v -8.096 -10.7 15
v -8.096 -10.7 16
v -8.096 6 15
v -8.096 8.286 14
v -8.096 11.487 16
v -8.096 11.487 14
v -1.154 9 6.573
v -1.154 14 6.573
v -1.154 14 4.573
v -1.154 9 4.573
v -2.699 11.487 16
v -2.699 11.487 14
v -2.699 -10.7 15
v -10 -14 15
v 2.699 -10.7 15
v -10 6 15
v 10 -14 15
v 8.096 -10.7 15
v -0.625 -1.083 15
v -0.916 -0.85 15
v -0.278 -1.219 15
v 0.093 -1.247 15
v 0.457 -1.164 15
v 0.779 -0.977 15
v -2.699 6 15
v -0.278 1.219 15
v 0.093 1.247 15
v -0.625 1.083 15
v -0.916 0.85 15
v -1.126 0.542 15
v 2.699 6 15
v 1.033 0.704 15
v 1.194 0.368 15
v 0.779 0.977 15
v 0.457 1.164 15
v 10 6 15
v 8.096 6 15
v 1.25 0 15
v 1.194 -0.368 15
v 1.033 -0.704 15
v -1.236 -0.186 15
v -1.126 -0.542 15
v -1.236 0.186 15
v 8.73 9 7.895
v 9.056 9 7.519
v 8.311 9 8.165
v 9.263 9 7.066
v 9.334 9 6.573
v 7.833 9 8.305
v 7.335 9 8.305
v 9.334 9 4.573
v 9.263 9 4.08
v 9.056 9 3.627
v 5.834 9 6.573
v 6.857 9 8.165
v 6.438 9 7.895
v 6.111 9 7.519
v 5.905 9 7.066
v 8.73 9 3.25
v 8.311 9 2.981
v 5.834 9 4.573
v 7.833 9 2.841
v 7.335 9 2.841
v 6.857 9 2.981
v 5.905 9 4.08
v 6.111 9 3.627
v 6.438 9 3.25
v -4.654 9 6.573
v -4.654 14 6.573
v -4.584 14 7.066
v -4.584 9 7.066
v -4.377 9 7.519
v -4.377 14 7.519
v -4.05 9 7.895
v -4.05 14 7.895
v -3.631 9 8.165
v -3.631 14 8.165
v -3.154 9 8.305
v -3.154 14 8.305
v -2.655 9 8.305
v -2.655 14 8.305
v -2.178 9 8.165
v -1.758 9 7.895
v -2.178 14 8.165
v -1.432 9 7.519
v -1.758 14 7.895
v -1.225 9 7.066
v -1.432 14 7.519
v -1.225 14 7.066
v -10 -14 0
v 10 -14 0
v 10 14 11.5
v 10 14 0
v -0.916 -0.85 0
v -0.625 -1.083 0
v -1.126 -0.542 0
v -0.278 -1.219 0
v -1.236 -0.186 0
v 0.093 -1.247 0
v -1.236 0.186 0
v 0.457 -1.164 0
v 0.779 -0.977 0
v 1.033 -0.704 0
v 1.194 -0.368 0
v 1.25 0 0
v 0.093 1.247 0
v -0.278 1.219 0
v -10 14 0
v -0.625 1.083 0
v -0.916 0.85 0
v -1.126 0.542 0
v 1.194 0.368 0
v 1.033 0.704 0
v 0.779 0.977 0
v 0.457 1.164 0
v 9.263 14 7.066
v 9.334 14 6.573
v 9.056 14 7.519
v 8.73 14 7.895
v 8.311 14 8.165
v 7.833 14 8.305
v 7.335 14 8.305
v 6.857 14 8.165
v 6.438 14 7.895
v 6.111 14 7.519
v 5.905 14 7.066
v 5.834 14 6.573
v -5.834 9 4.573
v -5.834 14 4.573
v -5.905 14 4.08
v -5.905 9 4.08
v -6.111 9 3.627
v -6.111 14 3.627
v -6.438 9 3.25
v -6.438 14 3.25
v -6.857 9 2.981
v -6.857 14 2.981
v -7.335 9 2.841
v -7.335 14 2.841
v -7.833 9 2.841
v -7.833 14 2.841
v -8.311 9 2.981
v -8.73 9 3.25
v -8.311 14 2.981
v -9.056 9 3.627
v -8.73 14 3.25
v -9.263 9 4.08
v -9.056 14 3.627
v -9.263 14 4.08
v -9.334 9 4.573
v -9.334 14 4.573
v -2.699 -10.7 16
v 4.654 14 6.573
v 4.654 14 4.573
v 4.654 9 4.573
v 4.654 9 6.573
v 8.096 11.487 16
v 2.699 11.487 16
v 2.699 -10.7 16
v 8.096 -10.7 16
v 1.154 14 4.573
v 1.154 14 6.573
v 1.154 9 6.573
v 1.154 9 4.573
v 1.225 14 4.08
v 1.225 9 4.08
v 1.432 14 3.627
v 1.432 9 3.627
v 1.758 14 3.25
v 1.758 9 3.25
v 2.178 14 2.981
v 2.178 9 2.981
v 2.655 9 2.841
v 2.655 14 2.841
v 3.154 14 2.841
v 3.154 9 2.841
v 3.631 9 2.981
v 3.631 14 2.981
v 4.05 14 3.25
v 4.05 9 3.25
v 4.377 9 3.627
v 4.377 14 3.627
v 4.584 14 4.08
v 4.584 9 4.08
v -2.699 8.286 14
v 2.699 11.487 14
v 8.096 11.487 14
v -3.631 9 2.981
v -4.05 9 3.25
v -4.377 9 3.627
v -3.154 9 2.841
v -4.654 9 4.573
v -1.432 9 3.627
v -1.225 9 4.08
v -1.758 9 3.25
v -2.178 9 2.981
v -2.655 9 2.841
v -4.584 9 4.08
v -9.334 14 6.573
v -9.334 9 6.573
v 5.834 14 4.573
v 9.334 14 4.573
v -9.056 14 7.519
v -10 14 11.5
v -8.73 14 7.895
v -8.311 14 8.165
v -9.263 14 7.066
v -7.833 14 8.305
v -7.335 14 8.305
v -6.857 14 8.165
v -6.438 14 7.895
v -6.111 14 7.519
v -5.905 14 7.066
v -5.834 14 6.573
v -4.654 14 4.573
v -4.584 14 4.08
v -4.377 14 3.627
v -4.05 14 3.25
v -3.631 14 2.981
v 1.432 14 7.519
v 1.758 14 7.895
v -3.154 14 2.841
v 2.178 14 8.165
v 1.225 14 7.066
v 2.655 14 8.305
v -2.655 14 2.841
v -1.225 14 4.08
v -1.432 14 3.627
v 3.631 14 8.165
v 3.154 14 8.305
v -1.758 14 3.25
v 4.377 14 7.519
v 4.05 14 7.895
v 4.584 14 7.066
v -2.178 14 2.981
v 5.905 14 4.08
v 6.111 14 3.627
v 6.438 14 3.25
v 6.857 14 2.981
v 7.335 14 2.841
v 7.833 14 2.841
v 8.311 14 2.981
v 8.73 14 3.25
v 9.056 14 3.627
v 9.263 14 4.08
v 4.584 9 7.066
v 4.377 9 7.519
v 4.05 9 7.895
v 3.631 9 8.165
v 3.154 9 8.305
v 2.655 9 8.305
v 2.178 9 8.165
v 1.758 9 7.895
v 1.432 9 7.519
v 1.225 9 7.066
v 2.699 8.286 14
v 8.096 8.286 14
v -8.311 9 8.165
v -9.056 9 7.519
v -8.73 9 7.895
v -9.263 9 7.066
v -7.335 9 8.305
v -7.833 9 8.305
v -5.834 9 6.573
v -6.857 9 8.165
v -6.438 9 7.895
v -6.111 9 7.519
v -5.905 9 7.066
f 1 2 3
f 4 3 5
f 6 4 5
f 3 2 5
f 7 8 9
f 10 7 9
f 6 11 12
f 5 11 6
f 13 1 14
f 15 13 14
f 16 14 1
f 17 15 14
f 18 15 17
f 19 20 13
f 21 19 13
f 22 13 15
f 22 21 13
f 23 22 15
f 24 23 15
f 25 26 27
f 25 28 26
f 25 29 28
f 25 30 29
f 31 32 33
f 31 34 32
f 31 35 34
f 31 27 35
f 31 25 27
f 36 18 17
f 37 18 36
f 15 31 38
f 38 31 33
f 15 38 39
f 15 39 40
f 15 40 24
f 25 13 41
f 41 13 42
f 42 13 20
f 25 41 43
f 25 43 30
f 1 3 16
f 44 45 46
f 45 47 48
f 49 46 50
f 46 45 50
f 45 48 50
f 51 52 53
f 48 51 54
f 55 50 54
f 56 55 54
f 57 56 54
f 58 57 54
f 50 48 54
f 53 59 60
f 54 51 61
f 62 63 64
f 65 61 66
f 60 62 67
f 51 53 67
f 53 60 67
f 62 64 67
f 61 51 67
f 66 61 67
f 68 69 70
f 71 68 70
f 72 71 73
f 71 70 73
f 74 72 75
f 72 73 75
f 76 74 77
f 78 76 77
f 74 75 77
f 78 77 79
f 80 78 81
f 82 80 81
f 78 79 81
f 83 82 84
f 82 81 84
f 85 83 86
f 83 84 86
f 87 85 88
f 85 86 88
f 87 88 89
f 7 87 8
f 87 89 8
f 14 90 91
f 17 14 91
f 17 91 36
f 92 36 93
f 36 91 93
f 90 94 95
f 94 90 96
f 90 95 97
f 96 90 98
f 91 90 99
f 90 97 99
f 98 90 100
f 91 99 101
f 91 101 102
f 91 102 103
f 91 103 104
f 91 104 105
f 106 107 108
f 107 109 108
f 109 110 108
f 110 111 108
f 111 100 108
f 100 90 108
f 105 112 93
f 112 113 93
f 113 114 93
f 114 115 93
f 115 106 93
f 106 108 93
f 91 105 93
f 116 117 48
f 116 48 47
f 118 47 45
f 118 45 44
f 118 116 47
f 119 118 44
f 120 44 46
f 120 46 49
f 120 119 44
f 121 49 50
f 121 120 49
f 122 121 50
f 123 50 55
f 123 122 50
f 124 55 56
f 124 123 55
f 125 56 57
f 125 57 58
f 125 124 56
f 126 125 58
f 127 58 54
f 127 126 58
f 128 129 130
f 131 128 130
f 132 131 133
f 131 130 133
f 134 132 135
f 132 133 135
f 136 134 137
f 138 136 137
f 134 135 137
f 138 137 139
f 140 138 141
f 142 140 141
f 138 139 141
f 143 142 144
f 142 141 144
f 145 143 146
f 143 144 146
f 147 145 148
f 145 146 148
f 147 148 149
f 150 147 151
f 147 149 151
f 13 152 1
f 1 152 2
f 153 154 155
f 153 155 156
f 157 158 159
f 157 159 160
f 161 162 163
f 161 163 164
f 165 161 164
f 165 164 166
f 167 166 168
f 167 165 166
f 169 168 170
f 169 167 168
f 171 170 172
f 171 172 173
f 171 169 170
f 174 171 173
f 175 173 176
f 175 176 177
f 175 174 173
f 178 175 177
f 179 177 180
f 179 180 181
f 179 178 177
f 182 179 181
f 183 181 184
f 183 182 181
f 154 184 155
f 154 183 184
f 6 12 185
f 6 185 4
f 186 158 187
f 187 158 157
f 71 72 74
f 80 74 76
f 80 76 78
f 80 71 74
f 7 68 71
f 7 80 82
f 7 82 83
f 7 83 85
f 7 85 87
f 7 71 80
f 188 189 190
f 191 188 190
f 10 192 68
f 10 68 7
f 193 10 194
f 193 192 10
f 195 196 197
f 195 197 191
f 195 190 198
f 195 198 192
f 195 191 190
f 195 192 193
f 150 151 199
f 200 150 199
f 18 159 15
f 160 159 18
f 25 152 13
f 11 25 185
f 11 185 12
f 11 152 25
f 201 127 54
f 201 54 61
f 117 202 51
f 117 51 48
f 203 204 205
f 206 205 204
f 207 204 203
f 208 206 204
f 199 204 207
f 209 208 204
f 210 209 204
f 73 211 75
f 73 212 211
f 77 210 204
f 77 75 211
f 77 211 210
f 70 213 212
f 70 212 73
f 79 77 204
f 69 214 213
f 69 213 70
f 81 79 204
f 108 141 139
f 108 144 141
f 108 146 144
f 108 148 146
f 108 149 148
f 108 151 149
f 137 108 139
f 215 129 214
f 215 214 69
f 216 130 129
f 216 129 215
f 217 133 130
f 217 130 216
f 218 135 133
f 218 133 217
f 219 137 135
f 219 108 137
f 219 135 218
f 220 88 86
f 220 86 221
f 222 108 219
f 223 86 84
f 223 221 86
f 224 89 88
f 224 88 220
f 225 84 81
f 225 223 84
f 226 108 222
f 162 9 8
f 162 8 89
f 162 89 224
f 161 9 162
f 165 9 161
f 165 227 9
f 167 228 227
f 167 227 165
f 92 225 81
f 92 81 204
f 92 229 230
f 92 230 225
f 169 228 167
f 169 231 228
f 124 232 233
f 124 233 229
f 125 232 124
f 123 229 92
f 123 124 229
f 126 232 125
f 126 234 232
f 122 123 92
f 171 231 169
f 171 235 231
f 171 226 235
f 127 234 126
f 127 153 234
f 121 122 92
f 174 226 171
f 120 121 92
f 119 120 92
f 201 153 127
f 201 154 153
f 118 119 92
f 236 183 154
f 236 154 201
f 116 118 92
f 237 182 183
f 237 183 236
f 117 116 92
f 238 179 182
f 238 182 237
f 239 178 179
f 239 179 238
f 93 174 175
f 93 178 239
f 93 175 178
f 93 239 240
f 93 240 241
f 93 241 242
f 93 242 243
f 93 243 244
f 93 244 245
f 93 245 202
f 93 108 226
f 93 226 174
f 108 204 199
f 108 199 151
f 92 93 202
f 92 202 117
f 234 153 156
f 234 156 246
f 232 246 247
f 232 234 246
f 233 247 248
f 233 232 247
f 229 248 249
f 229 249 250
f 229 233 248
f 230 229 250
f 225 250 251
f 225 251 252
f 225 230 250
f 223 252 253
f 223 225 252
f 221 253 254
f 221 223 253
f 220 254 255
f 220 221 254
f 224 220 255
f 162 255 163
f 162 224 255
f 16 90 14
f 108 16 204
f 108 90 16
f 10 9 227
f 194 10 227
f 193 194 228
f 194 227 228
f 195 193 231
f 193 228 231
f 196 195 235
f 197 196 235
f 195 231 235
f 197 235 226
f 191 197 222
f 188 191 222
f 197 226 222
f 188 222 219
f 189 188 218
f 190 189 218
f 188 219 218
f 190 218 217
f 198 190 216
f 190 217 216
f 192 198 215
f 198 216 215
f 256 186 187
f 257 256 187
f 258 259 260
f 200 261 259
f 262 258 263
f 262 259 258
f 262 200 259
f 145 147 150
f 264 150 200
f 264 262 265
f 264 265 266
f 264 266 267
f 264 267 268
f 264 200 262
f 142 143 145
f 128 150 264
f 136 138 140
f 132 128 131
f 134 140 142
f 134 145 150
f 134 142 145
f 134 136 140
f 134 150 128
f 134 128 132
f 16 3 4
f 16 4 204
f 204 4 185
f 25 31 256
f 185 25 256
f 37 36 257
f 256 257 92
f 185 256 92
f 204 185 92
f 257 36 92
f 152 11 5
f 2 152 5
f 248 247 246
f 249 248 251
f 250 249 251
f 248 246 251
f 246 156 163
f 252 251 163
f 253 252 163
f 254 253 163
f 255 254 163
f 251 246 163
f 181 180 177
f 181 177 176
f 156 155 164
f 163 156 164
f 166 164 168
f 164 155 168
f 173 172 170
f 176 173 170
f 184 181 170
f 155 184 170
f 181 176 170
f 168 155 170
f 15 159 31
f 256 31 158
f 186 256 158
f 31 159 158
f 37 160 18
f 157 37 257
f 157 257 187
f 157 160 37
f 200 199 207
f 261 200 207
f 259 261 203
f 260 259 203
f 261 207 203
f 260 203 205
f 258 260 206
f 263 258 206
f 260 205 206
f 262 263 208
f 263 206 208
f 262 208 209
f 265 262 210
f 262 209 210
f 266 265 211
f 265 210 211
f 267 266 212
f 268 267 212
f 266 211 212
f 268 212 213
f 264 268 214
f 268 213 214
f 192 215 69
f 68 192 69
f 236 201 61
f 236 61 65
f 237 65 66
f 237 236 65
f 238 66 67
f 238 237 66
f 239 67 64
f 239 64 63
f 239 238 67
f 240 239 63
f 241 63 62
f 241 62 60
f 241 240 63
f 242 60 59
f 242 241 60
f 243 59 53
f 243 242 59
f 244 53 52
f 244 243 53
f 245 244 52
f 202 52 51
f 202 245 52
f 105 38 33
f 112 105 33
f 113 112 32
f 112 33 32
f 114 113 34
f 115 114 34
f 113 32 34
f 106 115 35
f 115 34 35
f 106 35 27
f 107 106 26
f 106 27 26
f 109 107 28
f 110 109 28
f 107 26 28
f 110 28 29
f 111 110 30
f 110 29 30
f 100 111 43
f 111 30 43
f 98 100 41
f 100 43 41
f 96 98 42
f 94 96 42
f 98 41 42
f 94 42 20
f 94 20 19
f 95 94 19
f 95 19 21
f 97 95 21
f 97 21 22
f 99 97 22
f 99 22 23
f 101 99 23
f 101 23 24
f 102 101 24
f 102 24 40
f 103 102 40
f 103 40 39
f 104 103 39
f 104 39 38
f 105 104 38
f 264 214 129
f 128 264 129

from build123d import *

# Parameters (mm, degrees)
SKETCH1_W           = 20
SKETCH1_H           = 28
BOSS_EXTRUDE1_DEPTH = 15
CUT_EXTRUDE1_DEPTH  = 21
CUT_EXTRUDE2_DEPTH  = 5
SKETCH4_W           = 5.397016415
SKETCH4_H           = 22.187734152
BOSS_EXTRUDE2_DEPTH = 1
SKETCH5_R           = 1.25
CUT_EXTRUDE3_DEPTH  = 16


with BuildPart() as part:
    # Sketch1 → Boss-Extrude1 (new body)
    with BuildSketch(Plane.XY):
        Rectangle(SKETCH1_W, SKETCH1_H)
    extrude(amount=BOSS_EXTRUDE1_DEPTH)

    # Sketch2 → Cut-Extrude1 (cut, through all)
    with BuildSketch(Plane(origin=(10, 0, 0), x_dir=(0, 0, -1), z_dir=(1, 0, 0))):
        Polygon((-11.5, 14), (-15, 14), (-15, 6), align=None)
    extrude(amount=-CUT_EXTRUDE1_DEPTH, mode=Mode.SUBTRACT)

    # Sketch3 → Cut-Extrude2 (cut)
    with BuildSketch(Plane(origin=(0, 14, 0), x_dir=(1, 0, 0), z_dir=(0, 1, 0))):
        with BuildLine():
            Line((4.654488589, -4.572843843), (4.654488589, -6.572843843))
            ThreePointArc((4.654488589, -6.572843843), (2.904488589, -8.322843843), (1.154488589, -6.572843843))
            Line((1.154488589, -6.572843843), (1.154488589, -4.572843843))
            ThreePointArc((1.154488589, -4.572843843), (2.904488589, -2.822843843), (4.654488589, -4.572843843))
        make_face()
        with BuildLine():
            Line((9.333625698, -4.572843843), (9.333625698, -6.572843843))
            ThreePointArc((9.333625698, -6.572843843), (7.583625698, -8.322843843), (5.833625698, -6.572843843))
            Line((5.833625698, -6.572843843), (5.833625698, -4.572843843))
            ThreePointArc((5.833625698, -4.572843843), (7.583625698, -2.822843843), (9.333625698, -4.572843843))
        make_face()
    cut_extrude2 = extrude(amount=-CUT_EXTRUDE2_DEPTH, mode=Mode.SUBTRACT)

    # Sketch4 → Boss-Extrude2 (add, symmetric)
    with BuildSketch(Plane.XY.offset(15)):
        with Locations((5.397016416, 0.393532447)):
            Rectangle(SKETCH4_W, SKETCH4_H)
    boss_extrude2 = extrude(amount=BOSS_EXTRUDE2_DEPTH, both=True)

    # Mirror1: Cut-Extrude2, Boss-Extrude2 across plane
    add(cut_extrude2.mirror(Plane(origin=(0, 0, 0), x_dir=(0, 0, 1), z_dir=(1, 0, 0))), mode=Mode.SUBTRACT)
    add(boss_extrude2.mirror(Plane(origin=(0, 0, 0), x_dir=(0, 0, 1), z_dir=(1, 0, 0))))

    # Sketch5 → Cut-Extrude3 (cut, through all)
    with BuildSketch(Plane.XY.offset(15)):
        Circle(SKETCH5_R)
    extrude(amount=-CUT_EXTRUDE3_DEPTH, mode=Mode.SUBTRACT)


solid = part.part
